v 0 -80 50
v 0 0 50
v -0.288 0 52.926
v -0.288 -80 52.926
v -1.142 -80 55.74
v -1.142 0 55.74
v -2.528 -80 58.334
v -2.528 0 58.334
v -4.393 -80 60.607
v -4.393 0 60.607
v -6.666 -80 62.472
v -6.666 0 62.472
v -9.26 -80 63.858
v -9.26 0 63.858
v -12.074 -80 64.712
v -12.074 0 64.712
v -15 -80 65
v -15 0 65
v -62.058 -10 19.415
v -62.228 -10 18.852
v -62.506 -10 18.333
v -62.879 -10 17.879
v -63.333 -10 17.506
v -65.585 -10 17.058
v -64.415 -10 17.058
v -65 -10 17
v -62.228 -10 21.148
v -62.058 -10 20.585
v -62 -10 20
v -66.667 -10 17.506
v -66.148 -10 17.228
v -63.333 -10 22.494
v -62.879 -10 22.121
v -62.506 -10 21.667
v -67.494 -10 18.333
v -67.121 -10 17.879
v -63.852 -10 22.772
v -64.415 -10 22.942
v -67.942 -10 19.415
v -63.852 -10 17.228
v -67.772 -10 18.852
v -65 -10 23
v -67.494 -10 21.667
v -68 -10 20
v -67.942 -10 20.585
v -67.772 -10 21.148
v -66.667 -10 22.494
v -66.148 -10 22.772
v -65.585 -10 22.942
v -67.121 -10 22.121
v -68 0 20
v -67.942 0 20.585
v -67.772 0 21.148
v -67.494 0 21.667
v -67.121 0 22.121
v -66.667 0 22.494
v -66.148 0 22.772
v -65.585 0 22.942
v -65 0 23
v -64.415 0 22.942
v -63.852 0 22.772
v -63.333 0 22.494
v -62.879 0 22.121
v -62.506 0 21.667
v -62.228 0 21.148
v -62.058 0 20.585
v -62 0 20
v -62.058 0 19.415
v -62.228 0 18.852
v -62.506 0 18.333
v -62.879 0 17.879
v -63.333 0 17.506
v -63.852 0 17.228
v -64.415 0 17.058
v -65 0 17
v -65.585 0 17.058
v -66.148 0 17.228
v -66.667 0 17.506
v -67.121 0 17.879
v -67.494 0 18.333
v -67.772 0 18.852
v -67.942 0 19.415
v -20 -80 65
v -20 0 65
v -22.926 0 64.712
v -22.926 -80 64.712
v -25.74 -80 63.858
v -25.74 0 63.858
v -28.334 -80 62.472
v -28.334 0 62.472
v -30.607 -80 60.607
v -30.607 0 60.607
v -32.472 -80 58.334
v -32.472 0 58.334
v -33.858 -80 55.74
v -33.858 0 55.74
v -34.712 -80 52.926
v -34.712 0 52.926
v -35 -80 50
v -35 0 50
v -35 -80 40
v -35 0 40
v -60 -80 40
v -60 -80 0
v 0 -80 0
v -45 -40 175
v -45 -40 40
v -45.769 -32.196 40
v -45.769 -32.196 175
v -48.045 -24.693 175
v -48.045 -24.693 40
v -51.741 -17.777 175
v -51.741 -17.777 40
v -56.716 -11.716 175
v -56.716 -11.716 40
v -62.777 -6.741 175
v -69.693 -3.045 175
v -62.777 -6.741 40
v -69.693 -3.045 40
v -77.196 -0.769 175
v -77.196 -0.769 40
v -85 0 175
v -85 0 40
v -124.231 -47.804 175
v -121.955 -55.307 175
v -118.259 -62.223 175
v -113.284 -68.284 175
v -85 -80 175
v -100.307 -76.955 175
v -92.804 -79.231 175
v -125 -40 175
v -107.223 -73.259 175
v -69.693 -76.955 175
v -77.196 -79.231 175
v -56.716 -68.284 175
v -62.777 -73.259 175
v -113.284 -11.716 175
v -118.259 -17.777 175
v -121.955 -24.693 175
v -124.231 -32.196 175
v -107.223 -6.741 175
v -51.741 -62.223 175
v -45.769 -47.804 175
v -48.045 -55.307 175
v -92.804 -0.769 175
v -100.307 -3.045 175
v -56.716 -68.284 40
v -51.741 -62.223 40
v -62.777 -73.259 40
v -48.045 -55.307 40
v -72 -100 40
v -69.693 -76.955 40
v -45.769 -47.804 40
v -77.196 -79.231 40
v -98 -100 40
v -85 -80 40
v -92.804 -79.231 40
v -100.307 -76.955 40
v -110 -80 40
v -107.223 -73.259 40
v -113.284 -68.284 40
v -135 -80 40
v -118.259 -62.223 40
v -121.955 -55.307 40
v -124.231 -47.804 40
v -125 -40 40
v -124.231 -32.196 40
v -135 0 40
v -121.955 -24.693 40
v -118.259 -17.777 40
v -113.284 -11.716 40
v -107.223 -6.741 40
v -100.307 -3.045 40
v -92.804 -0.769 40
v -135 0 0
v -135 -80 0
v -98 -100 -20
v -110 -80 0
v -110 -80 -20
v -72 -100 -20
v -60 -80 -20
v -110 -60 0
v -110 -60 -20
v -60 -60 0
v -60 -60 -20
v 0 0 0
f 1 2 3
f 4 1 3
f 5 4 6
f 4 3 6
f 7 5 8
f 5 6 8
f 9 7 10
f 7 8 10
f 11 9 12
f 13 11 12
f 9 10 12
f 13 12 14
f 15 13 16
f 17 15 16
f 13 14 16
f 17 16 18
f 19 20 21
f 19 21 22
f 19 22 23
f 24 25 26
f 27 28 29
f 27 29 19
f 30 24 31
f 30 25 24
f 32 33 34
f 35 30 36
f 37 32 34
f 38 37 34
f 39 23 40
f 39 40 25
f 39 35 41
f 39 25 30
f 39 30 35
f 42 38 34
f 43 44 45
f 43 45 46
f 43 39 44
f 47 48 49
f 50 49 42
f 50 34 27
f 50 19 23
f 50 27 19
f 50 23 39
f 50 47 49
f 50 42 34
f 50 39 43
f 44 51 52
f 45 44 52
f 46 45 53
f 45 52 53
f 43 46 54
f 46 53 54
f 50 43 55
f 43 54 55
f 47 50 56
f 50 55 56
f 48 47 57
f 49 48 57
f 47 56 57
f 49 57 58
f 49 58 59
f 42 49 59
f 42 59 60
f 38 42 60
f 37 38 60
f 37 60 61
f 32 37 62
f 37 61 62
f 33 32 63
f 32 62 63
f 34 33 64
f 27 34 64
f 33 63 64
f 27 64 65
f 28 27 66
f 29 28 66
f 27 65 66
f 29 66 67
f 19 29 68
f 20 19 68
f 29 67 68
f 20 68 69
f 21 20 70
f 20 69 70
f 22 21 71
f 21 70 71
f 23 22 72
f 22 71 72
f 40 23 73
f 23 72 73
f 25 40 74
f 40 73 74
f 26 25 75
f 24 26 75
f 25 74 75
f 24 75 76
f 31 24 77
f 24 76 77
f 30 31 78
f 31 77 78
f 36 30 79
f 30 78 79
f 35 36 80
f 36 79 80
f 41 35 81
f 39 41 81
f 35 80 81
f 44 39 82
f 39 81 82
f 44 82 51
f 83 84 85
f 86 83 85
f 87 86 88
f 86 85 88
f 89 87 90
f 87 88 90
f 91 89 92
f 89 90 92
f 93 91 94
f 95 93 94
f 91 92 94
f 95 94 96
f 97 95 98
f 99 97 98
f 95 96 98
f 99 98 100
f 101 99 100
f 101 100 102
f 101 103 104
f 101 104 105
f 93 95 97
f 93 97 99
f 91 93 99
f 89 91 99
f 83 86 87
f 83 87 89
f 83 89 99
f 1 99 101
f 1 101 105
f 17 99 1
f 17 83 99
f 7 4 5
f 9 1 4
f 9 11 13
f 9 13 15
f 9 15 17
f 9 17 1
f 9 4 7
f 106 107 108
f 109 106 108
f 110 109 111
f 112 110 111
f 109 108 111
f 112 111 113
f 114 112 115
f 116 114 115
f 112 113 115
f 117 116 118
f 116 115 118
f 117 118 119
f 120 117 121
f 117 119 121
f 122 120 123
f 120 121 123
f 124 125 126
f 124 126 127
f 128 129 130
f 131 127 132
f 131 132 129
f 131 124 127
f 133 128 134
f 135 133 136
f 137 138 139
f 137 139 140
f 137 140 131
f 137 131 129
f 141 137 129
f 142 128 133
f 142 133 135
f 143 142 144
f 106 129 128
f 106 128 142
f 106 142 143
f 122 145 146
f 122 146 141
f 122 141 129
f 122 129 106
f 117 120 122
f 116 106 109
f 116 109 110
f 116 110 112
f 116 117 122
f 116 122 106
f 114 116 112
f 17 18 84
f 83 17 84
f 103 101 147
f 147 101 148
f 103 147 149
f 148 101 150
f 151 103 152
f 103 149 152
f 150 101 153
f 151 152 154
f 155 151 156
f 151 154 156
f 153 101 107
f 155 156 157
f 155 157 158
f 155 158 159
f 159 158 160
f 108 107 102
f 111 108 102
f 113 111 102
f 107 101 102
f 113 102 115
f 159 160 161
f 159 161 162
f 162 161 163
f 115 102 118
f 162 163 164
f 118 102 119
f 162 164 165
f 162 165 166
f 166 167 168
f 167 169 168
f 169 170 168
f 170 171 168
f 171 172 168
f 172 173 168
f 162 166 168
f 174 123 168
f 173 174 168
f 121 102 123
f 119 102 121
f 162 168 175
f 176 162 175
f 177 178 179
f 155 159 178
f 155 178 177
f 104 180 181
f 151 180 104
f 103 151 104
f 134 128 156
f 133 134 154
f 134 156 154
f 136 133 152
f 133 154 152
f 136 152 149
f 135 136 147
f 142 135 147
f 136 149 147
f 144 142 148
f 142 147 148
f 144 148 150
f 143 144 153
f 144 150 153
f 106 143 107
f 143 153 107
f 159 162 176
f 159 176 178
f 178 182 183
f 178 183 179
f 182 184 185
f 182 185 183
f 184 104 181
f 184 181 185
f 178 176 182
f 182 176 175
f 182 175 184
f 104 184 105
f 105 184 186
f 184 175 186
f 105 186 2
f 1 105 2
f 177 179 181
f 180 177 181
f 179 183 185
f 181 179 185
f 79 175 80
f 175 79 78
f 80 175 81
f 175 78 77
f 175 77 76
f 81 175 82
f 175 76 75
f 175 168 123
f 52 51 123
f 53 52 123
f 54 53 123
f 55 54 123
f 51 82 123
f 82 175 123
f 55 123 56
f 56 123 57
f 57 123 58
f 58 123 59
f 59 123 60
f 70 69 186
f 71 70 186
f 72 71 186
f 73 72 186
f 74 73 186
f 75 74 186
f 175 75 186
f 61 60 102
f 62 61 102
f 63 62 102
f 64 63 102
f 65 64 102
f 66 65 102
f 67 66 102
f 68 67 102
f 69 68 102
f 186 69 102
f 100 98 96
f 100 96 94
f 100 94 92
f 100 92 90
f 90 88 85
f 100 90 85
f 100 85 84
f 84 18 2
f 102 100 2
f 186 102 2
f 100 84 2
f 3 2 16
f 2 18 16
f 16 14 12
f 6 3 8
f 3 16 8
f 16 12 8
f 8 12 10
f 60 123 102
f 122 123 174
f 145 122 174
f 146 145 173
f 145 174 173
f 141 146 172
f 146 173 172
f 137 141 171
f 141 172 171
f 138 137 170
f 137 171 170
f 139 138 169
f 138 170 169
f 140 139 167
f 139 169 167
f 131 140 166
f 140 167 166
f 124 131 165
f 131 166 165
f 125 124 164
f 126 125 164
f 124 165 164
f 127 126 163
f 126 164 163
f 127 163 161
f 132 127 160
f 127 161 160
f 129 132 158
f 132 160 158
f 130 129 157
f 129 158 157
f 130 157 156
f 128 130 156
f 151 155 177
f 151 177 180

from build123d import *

# Parameters (mm, degrees)
F1_DEPTH = 80
F3_DEPTH = 135
F5_DEPTH = 60
F6_R     = 3
F7_DEPTH = 10


# Not quite as in the source:
# - a feature names something its author has since deleted; it is built from what else it names


with BuildPart() as f1:
    # F0 (on Front) → F1 (new body)
    with BuildSketch(Plane.XZ):
        with BuildLine():
            Line((-135, 0), (0, 0))
            Line((0, 0), (0, 50))
            ThreePointArc((0, 50), (-4.3933982822, 60.6066017178), (-15, 65))
            Line((-15, 65), (-20, 65))
            ThreePointArc((-20, 65), (-30.6066017178, 60.6066017178), (-35, 50))
            Line((-35, 50), (-35, 40))
            Line((-35, 40), (-135, 40))
            Line((-135, 40), (-135, 0))
        make_face()
    extrude(amount=F1_DEPTH)

    # F2 (on face) → F3 (join)
    with BuildSketch(Plane.XY.offset(40)):
        with BuildLine():
            ThreePointArc((-45, -40), (-56.7157287525, -11.7157287525), (-85, 0))
            ThreePointArc((-85, 0), (-125, -40), (-85, -80))
            ThreePointArc((-85, -80), (-56.7157287525, -68.2842712475), (-45, -40))
        make_face()
    extrude(amount=F3_DEPTH)

    # F4 (on face) → F5 (join)
    with BuildSketch(Plane.XY.offset(40)):
        with BuildLine():
            Line((-60, -60), (-110, -60))
            Line((-110, -60), (-110, -71.224989992))
            ThreePointArc((-110, -71.224989992), (-98.247648854, -77.7425462819), (-85, -80))
            ThreePointArc((-85, -80), (-71.7523511459, -77.7425462819), (-60, -71.224989992))
            Line((-60, -71.224989992), (-60, -60))
        make_face()
        with BuildLine():
            ThreePointArc((-85, -80), (-98.247648854, -77.7425462819), (-110, -71.224989992))
            Line((-110, -71.224989992), (-110, -80))
            Line((-110, -80), (-98, -100))
            Line((-98, -100), (-72, -100))
            Line((-72, -100), (-60, -80))
            Line((-60, -80), (-85, -80))
        make_face()
        with BuildLine():
            Line((-60, -80), (-60, -71.224989992))
            ThreePointArc((-60, -71.224989992), (-71.7523511459, -77.7425462819), (-85, -80))
            Line((-85, -80), (-60, -80))
        make_face()
    extrude(amount=-F5_DEPTH)

    # F6 (on face) → F7 (cut)
    with BuildSketch(Plane(origin=(0, 0, 0), x_dir=(-1, 0, 0), z_dir=(0, 1, 0))):
        with Locations((65, 20)):
            Circle(F6_R)
    extrude(amount=-F7_DEPTH, mode=Mode.SUBTRACT)


solid = f1.part
